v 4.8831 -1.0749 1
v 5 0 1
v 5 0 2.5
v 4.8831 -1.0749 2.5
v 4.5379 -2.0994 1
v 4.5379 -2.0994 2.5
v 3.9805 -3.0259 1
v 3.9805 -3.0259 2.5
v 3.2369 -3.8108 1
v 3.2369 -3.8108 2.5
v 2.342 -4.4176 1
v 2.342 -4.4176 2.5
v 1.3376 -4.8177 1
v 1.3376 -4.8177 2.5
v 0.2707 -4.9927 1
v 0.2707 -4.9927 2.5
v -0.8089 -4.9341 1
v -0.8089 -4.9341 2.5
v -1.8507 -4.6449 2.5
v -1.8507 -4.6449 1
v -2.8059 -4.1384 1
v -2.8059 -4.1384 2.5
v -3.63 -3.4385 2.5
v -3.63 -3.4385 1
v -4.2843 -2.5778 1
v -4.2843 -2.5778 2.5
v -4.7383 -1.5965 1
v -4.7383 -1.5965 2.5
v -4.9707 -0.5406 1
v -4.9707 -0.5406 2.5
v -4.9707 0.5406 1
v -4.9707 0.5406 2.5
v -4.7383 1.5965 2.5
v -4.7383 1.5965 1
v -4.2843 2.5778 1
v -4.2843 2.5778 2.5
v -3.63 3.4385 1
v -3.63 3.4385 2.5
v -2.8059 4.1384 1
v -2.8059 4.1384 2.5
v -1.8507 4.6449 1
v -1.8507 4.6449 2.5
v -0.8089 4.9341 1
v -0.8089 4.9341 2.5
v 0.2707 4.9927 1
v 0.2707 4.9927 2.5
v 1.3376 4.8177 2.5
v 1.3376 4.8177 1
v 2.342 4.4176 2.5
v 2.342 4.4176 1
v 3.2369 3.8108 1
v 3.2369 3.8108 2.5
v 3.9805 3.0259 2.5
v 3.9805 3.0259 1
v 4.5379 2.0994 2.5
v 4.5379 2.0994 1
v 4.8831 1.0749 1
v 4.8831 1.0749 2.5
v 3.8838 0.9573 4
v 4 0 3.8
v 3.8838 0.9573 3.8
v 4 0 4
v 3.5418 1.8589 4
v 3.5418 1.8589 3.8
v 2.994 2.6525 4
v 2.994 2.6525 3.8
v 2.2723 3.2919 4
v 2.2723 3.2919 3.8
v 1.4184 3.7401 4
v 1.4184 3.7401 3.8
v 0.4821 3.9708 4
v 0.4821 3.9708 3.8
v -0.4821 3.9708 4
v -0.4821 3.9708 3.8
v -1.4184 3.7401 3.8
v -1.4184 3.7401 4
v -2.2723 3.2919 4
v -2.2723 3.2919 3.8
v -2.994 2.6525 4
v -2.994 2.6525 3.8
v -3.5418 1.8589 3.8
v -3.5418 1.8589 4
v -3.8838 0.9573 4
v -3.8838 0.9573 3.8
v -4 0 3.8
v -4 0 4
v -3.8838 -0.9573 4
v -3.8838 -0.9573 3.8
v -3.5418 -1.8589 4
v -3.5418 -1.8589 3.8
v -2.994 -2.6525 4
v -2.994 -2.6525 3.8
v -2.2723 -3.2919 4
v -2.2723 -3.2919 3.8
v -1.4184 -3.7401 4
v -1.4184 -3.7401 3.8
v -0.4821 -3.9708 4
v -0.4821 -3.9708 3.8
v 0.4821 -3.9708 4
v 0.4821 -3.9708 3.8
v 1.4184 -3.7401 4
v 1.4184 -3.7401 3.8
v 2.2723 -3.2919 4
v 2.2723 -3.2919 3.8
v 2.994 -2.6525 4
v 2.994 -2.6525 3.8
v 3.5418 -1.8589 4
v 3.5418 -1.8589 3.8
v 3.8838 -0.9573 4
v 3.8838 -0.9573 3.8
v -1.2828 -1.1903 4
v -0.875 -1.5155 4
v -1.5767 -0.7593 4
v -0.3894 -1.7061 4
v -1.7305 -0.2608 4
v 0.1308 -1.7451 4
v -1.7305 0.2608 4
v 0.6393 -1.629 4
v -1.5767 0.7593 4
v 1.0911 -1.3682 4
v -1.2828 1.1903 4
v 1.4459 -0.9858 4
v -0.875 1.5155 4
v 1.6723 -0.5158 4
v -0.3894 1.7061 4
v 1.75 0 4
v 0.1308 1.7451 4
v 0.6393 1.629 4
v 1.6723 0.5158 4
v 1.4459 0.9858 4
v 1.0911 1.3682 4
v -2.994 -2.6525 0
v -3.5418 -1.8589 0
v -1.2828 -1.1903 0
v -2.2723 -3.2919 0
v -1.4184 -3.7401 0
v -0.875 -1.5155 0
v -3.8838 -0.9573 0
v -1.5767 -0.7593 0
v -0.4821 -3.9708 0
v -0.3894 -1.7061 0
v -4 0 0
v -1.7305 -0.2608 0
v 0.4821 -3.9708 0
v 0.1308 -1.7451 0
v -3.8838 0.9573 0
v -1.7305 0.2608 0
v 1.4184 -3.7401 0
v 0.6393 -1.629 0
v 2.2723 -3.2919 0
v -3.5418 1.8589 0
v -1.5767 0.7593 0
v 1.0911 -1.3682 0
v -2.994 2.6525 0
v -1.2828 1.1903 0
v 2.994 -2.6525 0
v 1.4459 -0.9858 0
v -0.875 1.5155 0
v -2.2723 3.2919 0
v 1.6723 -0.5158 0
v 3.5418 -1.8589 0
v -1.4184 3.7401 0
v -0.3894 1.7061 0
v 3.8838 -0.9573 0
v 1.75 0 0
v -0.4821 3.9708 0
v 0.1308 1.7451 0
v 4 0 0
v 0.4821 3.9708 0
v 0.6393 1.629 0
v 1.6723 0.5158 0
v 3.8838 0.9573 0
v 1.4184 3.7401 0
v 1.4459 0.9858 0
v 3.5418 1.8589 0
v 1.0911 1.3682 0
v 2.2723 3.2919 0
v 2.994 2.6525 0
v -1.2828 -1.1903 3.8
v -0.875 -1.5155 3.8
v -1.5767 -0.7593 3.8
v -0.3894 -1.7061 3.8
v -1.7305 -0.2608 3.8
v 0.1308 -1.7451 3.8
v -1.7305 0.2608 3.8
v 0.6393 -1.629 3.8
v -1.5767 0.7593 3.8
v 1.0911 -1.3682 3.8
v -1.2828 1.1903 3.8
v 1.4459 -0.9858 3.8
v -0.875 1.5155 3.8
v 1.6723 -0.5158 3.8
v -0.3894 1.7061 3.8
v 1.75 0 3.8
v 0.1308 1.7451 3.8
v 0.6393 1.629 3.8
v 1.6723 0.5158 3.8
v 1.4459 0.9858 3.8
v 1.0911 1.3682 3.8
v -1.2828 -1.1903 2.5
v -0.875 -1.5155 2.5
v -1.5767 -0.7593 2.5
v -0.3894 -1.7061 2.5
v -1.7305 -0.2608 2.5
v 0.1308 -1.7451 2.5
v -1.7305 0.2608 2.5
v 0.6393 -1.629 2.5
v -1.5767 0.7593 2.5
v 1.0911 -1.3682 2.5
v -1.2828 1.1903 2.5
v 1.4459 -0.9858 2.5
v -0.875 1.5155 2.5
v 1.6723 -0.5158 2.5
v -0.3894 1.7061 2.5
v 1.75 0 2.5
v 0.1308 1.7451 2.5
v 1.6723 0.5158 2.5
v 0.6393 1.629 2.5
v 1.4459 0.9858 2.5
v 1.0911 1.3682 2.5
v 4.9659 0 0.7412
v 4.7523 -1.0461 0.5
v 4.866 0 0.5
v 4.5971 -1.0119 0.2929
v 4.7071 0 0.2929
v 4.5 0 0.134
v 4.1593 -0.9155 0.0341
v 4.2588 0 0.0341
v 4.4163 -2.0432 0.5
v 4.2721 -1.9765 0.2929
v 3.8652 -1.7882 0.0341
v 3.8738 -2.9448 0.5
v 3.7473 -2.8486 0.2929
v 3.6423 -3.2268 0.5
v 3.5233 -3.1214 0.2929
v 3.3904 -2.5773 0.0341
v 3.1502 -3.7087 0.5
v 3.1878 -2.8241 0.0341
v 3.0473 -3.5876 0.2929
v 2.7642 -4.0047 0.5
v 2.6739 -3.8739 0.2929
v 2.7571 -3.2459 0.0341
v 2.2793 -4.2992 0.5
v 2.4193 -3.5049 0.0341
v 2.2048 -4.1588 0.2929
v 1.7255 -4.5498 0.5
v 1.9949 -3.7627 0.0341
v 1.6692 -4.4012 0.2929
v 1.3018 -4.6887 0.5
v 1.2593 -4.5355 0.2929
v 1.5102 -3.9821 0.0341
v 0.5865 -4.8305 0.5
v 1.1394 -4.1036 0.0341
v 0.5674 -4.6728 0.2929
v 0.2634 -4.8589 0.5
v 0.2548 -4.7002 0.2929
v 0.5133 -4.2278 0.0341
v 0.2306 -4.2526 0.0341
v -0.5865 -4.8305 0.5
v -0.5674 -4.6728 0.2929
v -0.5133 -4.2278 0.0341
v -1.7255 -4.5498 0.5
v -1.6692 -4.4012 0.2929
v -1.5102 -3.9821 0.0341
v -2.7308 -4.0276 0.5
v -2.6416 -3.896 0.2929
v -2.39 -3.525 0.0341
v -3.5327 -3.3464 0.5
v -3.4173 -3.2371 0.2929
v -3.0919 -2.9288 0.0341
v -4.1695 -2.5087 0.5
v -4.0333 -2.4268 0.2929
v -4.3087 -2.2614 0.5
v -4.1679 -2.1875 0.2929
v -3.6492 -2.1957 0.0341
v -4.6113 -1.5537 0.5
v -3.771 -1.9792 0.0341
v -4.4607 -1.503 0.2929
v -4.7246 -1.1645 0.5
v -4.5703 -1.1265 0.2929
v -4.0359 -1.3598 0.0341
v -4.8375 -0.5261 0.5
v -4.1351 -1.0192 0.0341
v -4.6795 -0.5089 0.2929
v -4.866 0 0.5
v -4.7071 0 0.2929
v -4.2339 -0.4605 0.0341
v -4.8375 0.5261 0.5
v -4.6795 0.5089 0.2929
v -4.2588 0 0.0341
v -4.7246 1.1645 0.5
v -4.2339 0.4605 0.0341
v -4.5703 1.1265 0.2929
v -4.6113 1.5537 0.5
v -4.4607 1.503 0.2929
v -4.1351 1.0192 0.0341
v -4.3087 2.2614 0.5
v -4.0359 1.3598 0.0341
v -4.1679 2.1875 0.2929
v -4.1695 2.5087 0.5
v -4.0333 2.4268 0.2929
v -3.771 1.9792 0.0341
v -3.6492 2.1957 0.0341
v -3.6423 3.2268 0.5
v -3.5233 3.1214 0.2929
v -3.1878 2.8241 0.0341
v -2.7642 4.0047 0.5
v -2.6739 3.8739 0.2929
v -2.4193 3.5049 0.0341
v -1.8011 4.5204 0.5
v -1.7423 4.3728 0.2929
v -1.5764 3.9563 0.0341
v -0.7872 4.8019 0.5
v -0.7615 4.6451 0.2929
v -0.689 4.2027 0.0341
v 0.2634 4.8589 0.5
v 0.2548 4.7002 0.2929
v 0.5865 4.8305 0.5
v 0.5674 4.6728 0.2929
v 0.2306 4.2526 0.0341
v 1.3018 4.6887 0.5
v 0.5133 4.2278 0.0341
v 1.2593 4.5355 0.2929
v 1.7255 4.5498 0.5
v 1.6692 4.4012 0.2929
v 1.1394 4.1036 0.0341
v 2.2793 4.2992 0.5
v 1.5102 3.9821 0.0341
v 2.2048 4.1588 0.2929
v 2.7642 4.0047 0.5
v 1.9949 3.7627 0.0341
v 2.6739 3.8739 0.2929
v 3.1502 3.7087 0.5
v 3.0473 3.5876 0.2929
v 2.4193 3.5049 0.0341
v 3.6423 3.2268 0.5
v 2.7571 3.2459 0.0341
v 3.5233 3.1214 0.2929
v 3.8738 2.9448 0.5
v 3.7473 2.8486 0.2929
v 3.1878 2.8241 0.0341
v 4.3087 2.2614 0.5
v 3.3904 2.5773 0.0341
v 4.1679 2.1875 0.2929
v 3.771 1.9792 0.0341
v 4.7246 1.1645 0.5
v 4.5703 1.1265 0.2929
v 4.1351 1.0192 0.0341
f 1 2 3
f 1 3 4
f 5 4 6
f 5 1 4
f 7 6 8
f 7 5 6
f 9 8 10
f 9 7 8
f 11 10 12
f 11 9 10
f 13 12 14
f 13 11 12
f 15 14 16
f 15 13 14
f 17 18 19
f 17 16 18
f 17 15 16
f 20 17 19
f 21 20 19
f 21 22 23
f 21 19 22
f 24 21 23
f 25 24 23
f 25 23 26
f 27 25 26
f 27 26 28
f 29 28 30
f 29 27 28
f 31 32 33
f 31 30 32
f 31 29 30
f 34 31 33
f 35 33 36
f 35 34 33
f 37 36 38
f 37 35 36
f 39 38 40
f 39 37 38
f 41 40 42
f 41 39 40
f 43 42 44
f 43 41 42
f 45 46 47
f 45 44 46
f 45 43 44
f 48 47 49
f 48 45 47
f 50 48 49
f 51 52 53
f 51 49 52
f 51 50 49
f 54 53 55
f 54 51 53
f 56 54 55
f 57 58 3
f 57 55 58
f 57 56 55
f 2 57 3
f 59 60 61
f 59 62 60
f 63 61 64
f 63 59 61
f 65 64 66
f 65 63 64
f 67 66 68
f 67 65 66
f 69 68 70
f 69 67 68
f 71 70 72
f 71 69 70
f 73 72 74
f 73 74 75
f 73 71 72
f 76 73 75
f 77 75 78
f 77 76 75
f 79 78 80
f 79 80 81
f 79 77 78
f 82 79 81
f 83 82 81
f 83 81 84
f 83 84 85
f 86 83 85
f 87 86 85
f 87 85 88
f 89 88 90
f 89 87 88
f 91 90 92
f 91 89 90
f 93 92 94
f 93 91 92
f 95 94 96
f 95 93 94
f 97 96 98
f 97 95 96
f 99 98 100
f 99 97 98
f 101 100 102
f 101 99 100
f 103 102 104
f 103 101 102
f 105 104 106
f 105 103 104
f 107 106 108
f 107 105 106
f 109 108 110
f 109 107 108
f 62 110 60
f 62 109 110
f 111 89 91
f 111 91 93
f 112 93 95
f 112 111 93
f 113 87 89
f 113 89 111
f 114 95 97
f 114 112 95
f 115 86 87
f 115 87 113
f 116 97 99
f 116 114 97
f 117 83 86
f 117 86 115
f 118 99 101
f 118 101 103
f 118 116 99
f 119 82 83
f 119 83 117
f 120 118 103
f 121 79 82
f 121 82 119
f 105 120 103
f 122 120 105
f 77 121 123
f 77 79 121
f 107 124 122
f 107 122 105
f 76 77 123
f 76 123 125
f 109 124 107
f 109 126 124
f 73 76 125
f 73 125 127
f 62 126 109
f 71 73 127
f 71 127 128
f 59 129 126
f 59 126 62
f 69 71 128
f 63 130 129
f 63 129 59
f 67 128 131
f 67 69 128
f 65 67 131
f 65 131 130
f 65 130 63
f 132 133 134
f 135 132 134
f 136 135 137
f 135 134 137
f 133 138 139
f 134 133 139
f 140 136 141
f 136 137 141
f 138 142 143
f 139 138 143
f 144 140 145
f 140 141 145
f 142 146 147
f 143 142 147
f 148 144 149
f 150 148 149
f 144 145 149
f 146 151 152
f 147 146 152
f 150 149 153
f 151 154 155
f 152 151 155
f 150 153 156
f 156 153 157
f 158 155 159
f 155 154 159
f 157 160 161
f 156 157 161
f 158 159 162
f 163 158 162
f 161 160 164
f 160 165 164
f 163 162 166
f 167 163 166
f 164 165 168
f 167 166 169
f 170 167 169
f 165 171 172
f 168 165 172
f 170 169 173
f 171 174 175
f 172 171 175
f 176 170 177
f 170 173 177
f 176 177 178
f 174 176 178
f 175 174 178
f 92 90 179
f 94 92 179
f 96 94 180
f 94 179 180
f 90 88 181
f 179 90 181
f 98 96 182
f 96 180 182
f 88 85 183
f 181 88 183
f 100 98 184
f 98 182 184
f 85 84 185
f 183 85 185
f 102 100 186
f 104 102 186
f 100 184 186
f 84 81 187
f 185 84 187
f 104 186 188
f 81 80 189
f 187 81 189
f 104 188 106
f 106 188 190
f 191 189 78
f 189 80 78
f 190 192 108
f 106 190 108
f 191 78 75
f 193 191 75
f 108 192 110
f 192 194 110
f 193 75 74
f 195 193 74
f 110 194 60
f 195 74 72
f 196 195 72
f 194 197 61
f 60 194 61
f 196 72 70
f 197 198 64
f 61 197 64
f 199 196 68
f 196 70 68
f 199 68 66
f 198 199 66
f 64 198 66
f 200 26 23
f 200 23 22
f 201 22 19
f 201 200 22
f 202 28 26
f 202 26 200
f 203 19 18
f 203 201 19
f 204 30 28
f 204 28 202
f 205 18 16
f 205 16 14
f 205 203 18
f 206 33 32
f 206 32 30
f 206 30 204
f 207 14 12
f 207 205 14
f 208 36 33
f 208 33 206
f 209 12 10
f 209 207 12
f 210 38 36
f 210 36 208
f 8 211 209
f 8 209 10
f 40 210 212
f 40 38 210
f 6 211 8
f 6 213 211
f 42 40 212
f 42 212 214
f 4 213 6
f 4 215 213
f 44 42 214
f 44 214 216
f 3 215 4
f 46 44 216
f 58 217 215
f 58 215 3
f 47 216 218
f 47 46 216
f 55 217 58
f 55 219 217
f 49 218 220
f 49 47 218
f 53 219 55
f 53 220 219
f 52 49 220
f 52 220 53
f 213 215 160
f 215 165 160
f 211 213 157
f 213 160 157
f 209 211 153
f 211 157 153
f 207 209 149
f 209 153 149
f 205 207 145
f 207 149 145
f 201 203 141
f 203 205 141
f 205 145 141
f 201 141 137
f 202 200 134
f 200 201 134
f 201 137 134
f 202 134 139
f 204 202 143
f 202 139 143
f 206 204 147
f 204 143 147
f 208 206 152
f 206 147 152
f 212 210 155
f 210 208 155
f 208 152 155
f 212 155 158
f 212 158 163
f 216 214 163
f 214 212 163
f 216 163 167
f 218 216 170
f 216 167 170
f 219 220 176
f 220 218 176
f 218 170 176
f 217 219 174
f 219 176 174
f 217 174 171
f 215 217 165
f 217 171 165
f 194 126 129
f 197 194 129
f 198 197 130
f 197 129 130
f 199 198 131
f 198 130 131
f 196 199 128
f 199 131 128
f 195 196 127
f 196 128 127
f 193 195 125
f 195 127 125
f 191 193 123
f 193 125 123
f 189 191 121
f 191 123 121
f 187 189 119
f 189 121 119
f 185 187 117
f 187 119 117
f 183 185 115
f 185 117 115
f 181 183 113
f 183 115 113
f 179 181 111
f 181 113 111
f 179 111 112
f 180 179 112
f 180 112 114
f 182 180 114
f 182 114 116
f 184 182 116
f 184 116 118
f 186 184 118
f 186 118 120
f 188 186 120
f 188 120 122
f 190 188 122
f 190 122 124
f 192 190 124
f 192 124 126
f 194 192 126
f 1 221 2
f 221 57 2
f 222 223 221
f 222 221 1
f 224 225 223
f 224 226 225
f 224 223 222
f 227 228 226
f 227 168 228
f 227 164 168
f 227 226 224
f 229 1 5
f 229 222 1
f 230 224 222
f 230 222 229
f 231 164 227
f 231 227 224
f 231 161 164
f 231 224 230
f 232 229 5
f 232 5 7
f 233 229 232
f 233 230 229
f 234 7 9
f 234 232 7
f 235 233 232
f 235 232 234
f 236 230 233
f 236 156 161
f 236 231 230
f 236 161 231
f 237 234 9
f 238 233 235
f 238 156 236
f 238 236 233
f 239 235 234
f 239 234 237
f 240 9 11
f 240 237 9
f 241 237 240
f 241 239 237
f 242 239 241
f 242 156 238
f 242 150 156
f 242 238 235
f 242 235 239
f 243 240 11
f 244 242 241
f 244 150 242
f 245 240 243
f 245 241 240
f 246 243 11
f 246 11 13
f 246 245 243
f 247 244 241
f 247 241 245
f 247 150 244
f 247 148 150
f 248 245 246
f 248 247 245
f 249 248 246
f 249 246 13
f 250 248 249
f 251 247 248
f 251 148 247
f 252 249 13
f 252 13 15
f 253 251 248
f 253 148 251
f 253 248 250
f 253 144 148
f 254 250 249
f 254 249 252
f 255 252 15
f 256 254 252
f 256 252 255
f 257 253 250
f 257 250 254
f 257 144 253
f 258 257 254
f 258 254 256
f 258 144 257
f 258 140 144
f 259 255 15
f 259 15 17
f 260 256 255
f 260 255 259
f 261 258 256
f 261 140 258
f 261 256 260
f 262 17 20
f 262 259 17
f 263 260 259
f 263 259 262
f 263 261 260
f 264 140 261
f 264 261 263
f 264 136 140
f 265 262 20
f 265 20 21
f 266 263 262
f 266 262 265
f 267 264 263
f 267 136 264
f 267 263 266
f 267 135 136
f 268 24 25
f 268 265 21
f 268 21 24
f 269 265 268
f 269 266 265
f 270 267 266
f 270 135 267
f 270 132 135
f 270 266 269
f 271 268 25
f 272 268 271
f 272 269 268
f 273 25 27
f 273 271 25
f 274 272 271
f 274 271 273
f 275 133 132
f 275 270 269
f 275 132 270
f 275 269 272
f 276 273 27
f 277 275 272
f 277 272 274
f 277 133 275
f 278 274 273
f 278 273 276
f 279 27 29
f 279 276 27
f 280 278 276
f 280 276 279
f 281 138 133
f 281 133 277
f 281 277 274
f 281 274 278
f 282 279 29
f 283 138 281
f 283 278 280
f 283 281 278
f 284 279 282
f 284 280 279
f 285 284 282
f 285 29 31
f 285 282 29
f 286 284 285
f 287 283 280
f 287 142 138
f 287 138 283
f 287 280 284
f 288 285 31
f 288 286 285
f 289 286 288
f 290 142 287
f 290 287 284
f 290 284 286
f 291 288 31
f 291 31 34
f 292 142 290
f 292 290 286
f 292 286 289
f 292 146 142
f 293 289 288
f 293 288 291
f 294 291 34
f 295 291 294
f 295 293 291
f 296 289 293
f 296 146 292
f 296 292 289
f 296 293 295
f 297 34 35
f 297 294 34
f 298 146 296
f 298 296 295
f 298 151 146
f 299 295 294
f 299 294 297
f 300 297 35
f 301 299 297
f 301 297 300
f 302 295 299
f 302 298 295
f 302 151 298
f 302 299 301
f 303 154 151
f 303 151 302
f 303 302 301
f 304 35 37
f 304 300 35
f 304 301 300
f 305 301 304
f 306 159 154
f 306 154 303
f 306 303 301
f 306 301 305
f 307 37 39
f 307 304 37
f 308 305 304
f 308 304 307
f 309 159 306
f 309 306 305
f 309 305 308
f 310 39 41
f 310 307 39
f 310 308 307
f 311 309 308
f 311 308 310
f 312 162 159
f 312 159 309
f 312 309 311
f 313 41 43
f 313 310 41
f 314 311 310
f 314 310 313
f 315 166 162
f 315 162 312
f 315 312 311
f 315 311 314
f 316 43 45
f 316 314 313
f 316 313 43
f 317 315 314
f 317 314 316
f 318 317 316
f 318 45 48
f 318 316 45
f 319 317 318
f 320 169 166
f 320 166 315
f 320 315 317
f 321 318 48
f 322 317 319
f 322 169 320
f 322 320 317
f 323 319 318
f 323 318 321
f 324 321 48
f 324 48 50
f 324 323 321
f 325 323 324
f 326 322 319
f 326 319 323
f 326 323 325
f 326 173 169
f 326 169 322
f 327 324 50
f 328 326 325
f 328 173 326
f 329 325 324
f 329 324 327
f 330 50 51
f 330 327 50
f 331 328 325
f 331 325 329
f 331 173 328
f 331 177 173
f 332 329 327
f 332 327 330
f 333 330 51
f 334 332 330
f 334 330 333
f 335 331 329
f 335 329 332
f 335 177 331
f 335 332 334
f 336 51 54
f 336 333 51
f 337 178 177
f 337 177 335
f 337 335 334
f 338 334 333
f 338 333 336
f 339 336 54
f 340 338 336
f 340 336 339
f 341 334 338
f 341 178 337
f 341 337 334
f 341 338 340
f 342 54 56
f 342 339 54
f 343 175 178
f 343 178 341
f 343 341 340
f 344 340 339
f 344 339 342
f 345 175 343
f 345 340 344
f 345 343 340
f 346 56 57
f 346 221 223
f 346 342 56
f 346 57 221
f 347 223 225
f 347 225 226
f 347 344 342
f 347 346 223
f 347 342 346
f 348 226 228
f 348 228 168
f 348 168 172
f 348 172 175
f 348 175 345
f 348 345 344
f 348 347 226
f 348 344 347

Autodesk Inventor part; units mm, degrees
ref_plane "YZ Plane" through (0, 0, 0) normal (1, 0, 0) x (0, 1, 0)
ref_plane "XZ Plane" through (0, 0, 0) normal (0, 1, 0) x (-1, 0, 0)
sketch "Sketch1" plane through (0, 0, 0) normal (0, 0, 1) x (1, 0, 0)
  circle A0 centre (0, 0) radius 5
  circle A1 centre (0, 0) radius 1.75
  dimension "d0" = 10
  dimension "d1" = 3.5
extrude "Extrusion1" add sketch "Sketch1" along normal blind 2.5
ref_plane "Work Plane1" through (0, 0, 4) normal (0, 0, 1) x (1, 0, 0)
sketch "Sketch2" plane through (0, 0, 4) normal (0, 0, 1) x (1, 0, 0)
  circle A0 centre (0, 0) radius 4
  circle A1 centre (0, 0) radius 1.75 projected
  dimension "d5" = 8
extrude "Extrusion2" add sketch "Sketch2" against normal blind 0.2
fillet "Fillet1" radius 1 1 edges at (-5, 0, 0)
properties part number "Pin" material "Aluminum 6061, Welded"
